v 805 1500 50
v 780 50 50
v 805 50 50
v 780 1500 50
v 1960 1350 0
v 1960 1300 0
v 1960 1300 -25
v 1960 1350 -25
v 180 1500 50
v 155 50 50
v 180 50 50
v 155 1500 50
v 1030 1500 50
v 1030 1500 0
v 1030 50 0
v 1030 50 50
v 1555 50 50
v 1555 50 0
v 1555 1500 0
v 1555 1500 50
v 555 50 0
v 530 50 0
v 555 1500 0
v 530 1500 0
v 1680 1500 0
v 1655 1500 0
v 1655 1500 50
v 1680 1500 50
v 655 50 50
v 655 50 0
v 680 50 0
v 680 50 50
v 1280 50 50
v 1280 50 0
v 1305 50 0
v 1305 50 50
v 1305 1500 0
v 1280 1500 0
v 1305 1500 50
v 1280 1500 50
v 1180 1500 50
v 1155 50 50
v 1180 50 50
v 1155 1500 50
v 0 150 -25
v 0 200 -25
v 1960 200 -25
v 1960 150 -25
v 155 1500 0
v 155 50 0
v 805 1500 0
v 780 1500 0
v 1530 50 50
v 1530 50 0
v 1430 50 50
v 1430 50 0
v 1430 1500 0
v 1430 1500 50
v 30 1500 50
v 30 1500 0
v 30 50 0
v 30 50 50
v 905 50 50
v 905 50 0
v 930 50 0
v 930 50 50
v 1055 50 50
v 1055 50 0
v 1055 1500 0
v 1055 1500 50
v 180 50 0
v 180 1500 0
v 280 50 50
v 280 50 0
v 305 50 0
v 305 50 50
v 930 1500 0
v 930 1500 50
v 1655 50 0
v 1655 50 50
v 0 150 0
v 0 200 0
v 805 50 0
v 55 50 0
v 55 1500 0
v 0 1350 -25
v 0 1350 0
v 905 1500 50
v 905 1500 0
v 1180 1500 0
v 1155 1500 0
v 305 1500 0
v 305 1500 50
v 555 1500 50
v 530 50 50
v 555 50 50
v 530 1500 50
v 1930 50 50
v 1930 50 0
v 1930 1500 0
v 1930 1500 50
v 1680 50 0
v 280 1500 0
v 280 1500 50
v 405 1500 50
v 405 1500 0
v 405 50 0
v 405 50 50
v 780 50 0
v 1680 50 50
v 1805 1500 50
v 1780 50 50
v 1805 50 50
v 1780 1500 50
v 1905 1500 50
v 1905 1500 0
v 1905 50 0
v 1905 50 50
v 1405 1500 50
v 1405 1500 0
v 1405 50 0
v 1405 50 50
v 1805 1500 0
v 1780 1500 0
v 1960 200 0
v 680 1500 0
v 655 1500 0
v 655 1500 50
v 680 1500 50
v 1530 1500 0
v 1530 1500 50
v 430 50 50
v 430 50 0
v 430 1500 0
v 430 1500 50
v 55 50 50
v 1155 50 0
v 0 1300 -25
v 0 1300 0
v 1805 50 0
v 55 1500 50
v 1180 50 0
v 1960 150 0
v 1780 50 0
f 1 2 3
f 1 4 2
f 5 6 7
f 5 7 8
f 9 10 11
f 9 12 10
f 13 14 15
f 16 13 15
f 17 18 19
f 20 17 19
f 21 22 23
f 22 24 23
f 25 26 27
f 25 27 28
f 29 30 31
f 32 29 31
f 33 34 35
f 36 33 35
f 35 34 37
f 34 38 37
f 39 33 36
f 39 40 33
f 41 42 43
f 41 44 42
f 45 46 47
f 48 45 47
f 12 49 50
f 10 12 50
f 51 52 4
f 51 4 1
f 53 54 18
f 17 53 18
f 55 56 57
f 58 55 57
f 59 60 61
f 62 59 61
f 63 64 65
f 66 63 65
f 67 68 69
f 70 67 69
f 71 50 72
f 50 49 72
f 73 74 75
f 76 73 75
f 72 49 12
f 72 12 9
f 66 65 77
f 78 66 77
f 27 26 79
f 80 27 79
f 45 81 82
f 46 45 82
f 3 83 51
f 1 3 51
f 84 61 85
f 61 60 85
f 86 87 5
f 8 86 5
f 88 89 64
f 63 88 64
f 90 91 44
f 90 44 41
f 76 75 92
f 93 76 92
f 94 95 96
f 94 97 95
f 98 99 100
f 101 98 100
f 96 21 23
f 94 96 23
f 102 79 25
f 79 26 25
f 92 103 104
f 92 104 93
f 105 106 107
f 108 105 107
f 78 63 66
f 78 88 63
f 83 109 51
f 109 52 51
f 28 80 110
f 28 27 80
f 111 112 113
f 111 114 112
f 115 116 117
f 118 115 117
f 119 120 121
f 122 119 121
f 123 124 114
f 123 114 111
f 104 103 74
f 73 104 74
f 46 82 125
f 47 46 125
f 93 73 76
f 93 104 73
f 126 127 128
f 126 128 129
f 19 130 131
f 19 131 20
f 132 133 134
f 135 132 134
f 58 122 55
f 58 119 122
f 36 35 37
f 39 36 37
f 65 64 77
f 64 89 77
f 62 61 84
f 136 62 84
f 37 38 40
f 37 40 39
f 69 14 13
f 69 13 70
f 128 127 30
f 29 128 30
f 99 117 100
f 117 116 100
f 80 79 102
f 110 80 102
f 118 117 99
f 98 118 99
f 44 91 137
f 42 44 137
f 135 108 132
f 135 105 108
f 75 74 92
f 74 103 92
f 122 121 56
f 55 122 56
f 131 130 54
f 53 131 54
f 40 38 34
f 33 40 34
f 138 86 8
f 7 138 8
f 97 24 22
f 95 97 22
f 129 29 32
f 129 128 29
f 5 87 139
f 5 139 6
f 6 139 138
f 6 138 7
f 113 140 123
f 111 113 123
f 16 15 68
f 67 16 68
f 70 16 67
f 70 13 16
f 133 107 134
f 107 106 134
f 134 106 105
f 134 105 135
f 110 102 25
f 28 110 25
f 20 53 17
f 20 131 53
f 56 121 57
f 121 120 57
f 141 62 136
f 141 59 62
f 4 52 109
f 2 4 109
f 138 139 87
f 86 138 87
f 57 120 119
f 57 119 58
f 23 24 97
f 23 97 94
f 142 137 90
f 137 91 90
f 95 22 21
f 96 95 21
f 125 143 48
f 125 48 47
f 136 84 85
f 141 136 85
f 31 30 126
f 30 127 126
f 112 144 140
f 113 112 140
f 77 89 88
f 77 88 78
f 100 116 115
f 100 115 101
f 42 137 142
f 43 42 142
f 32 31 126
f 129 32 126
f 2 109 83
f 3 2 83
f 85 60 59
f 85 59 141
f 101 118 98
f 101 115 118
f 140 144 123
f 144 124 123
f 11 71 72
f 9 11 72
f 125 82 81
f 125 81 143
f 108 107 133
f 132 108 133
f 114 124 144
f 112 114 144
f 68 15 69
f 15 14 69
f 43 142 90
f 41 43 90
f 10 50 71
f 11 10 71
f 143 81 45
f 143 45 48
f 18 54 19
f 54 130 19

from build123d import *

# Parameters (mm, degrees)
F0_W     = 25
F0_H     = 100
F0_H_2   = 150
F0_H_3   = 1150
F0_H_4   = 25
F1_DEPTH = 50
F2_W     = 1960
F2_H     = 50
F3_DEPTH = 25


with BuildPart() as f1:
    # F0 (on Top) → F1 (new body)
    with BuildSketch(Plane.XY):
        with Locations((42.5, 100)):
            Rectangle(F0_W, F0_H)
        with Locations((42.5, 1425)):
            Rectangle(F0_W, F0_H_2)
        with Locations((42.5, 750)):
            Rectangle(F0_W, F0_H_3)
        with Locations((42.5, 162.5)):
            Rectangle(F0_W, F0_H_4)
        with Locations((42.5, 1337.5)):
            Rectangle(F0_W, F0_H_4)
    extrude(amount=F1_DEPTH)


with BuildPart() as f1b:
    # F0 (on Top) → F1, piece 2 (new body)
    with BuildSketch(Plane.XY):
        with Locations((167.5, 100)):
            Rectangle(F0_W, F0_H)
        with Locations((167.5, 1425)):
            Rectangle(F0_W, F0_H_2)
        with Locations((167.5, 162.5)):
            Rectangle(F0_W, F0_H_4)
        with Locations((167.5, 1337.5)):
            Rectangle(F0_W, F0_H_4)
        with Locations((167.5, 750)):
            Rectangle(F0_W, F0_H_3)
    extrude(amount=F1_DEPTH)


with BuildPart() as f1c:
    # F0 (on Top) → F1, piece 3 (new body)
    with BuildSketch(Plane.XY):
        with Locations((292.5, 100)):
            Rectangle(F0_W, F0_H)
        with Locations((292.5, 1425)):
            Rectangle(F0_W, F0_H_2)
        with Locations((292.5, 162.5)):
            Rectangle(F0_W, F0_H_4)
        with Locations((292.5, 1337.5)):
            Rectangle(F0_W, F0_H_4)
        with Locations((292.5, 750)):
            Rectangle(F0_W, F0_H_3)
    extrude(amount=F1_DEPTH)


with BuildPart() as f1d:
    # F0 (on Top) → F1, piece 4 (new body)
    with BuildSketch(Plane.XY):
        with Locations((417.5, 100)):
            Rectangle(F0_W, F0_H)
        with Locations((417.5, 1425)):
            Rectangle(F0_W, F0_H_2)
        with Locations((417.5, 162.5)):
            Rectangle(F0_W, F0_H_4)
        with Locations((417.5, 1337.5)):
            Rectangle(F0_W, F0_H_4)
        with Locations((417.5, 750)):
            Rectangle(F0_W, F0_H_3)
    extrude(amount=F1_DEPTH)


with BuildPart() as f1e:
    # F0 (on Top) → F1, piece 5 (new body)
    with BuildSketch(Plane.XY):
        with Locations((542.5, 100)):
            Rectangle(F0_W, F0_H)
        with Locations((542.5, 1425)):
            Rectangle(F0_W, F0_H_2)
        with Locations((542.5, 162.5)):
            Rectangle(F0_W, F0_H_4)
        with Locations((542.5, 1337.5)):
            Rectangle(F0_W, F0_H_4)
        with Locations((542.5, 750)):
            Rectangle(F0_W, F0_H_3)
    extrude(amount=F1_DEPTH)


with BuildPart() as f1f:
    # F0 (on Top) → F1, piece 6 (new body)
    with BuildSketch(Plane.XY):
        with Locations((667.5, 100)):
            Rectangle(F0_W, F0_H)
        with Locations((667.5, 1425)):
            Rectangle(F0_W, F0_H_2)
        with Locations((667.5, 162.5)):
            Rectangle(F0_W, F0_H_4)
        with Locations((667.5, 1337.5)):
            Rectangle(F0_W, F0_H_4)
        with Locations((667.5, 750)):
            Rectangle(F0_W, F0_H_3)
    extrude(amount=F1_DEPTH)


with BuildPart() as f1g:
    # F0 (on Top) → F1, piece 7 (new body)
    with BuildSketch(Plane.XY):
        with Locations((792.5, 100)):
            Rectangle(F0_W, F0_H)
        with Locations((792.5, 1425)):
            Rectangle(F0_W, F0_H_2)
        with Locations((792.5, 162.5)):
            Rectangle(F0_W, F0_H_4)
        with Locations((792.5, 1337.5)):
            Rectangle(F0_W, F0_H_4)
        with Locations((792.5, 750)):
            Rectangle(F0_W, F0_H_3)
    extrude(amount=F1_DEPTH)


with BuildPart() as f1h:
    # F0 (on Top) → F1, piece 8 (new body)
    with BuildSketch(Plane.XY):
        with Locations((917.5, 100)):
            Rectangle(F0_W, F0_H)
        with Locations((917.5, 1425)):
            Rectangle(F0_W, F0_H_2)
        with Locations((917.5, 162.5)):
            Rectangle(F0_W, F0_H_4)
        with Locations((917.5, 1337.5)):
            Rectangle(F0_W, F0_H_4)
        with Locations((917.5, 750)):
            Rectangle(F0_W, F0_H_3)
    extrude(amount=F1_DEPTH)


with BuildPart() as f1i:
    # F0 (on Top) → F1, piece 9 (new body)
    with BuildSketch(Plane.XY):
        with Locations((1042.5, 100)):
            Rectangle(F0_W, F0_H)
        with Locations((1042.5, 1425)):
            Rectangle(F0_W, F0_H_2)
        with Locations((1042.5, 162.5)):
            Rectangle(F0_W, F0_H_4)
        with Locations((1042.5, 1337.5)):
            Rectangle(F0_W, F0_H_4)
        with Locations((1042.5, 750)):
            Rectangle(F0_W, F0_H_3)
    extrude(amount=F1_DEPTH)


with BuildPart() as f1j:
    # F0 (on Top) → F1, piece 10 (new body)
    with BuildSketch(Plane.XY):
        with Locations((1167.5, 100)):
            Rectangle(F0_W, F0_H)
        with Locations((1167.5, 1425)):
            Rectangle(F0_W, F0_H_2)
        with Locations((1167.5, 162.5)):
            Rectangle(F0_W, F0_H_4)
        with Locations((1167.5, 1337.5)):
            Rectangle(F0_W, F0_H_4)
        with Locations((1167.5, 750)):
            Rectangle(F0_W, F0_H_3)
    extrude(amount=F1_DEPTH)


with BuildPart() as f1k:
    # F0 (on Top) → F1, piece 11 (new body)
    with BuildSketch(Plane.XY):
        with Locations((1292.5, 100)):
            Rectangle(F0_W, F0_H)
        with Locations((1292.5, 1425)):
            Rectangle(F0_W, F0_H_2)
        with Locations((1292.5, 162.5)):
            Rectangle(F0_W, F0_H_4)
        with Locations((1292.5, 1337.5)):
            Rectangle(F0_W, F0_H_4)
        with Locations((1292.5, 750)):
            Rectangle(F0_W, F0_H_3)
    extrude(amount=F1_DEPTH)


with BuildPart() as f1l:
    # F0 (on Top) → F1, piece 12 (new body)
    with BuildSketch(Plane.XY):
        with Locations((1417.5, 100)):
            Rectangle(F0_W, F0_H)
        with Locations((1417.5, 1425)):
            Rectangle(F0_W, F0_H_2)
        with Locations((1417.5, 162.5)):
            Rectangle(F0_W, F0_H_4)
        with Locations((1417.5, 1337.5)):
            Rectangle(F0_W, F0_H_4)
        with Locations((1417.5, 750)):
            Rectangle(F0_W, F0_H_3)
    extrude(amount=F1_DEPTH)


with BuildPart() as f1m:
    # F0 (on Top) → F1, piece 13 (new body)
    with BuildSketch(Plane.XY):
        with Locations((1542.5, 100)):
            Rectangle(F0_W, F0_H)
        with Locations((1542.5, 1425)):
            Rectangle(F0_W, F0_H_2)
        with Locations((1542.5, 162.5)):
            Rectangle(F0_W, F0_H_4)
        with Locations((1542.5, 1337.5)):
            Rectangle(F0_W, F0_H_4)
        with Locations((1542.5, 750)):
            Rectangle(F0_W, F0_H_3)
    extrude(amount=F1_DEPTH)


with BuildPart() as f1n:
    # F0 (on Top) → F1, piece 14 (new body)
    with BuildSketch(Plane.XY):
        with Locations((1667.5, 100)):
            Rectangle(F0_W, F0_H)
        with Locations((1667.5, 1425)):
            Rectangle(F0_W, F0_H_2)
        with Locations((1667.5, 162.5)):
            Rectangle(F0_W, F0_H_4)
        with Locations((1667.5, 1337.5)):
            Rectangle(F0_W, F0_H_4)
        with Locations((1667.5, 750)):
            Rectangle(F0_W, F0_H_3)
    extrude(amount=F1_DEPTH)


with BuildPart() as f1o:
    # F0 (on Top) → F1, piece 15 (new body)
    with BuildSketch(Plane.XY):
        with Locations((1792.5, 100)):
            Rectangle(F0_W, F0_H)
        with Locations((1792.5, 1425)):
            Rectangle(F0_W, F0_H_2)
        with Locations((1792.5, 162.5)):
            Rectangle(F0_W, F0_H_4)
        with Locations((1792.5, 1337.5)):
            Rectangle(F0_W, F0_H_4)
        with Locations((1792.5, 750)):
            Rectangle(F0_W, F0_H_3)
    extrude(amount=F1_DEPTH)


with BuildPart() as f1p:
    # F0 (on Top) → F1, piece 16 (new body)
    with BuildSketch(Plane.XY):
        with Locations((1917.5, 100)):
            Rectangle(F0_W, F0_H)
        with Locations((1917.5, 1425)):
            Rectangle(F0_W, F0_H_2)
        with Locations((1917.5, 750)):
            Rectangle(F0_W, F0_H_3)
        with Locations((1917.5, 162.5)):
            Rectangle(F0_W, F0_H_4)
        with Locations((1917.5, 1337.5)):
            Rectangle(F0_W, F0_H_4)
    extrude(amount=F1_DEPTH)


with BuildPart() as f3:
    # F2 (on Top) → F3 (new body)
    with BuildSketch(Plane.XY):
        with Locations((980, 175)):
            Rectangle(F2_W, F2_H)
    extrude(amount=-F3_DEPTH)


with BuildPart() as f3b:
    # F2 (on Top) → F3, piece 2 (new body)
    with BuildSketch(Plane.XY):
        with Locations((980, 1325)):
            Rectangle(F2_W, F2_H)
    extrude(amount=-F3_DEPTH)


solid = Compound([f1.part, f1b.part, f1c.part, f1d.part, f1e.part, f1f.part, f1g.part, f1h.part, f1i.part, f1j.part, f1k.part, f1l.part, f1m.part, f1n.part, f1o.part, f1p.part, f3.part, f3b.part])
